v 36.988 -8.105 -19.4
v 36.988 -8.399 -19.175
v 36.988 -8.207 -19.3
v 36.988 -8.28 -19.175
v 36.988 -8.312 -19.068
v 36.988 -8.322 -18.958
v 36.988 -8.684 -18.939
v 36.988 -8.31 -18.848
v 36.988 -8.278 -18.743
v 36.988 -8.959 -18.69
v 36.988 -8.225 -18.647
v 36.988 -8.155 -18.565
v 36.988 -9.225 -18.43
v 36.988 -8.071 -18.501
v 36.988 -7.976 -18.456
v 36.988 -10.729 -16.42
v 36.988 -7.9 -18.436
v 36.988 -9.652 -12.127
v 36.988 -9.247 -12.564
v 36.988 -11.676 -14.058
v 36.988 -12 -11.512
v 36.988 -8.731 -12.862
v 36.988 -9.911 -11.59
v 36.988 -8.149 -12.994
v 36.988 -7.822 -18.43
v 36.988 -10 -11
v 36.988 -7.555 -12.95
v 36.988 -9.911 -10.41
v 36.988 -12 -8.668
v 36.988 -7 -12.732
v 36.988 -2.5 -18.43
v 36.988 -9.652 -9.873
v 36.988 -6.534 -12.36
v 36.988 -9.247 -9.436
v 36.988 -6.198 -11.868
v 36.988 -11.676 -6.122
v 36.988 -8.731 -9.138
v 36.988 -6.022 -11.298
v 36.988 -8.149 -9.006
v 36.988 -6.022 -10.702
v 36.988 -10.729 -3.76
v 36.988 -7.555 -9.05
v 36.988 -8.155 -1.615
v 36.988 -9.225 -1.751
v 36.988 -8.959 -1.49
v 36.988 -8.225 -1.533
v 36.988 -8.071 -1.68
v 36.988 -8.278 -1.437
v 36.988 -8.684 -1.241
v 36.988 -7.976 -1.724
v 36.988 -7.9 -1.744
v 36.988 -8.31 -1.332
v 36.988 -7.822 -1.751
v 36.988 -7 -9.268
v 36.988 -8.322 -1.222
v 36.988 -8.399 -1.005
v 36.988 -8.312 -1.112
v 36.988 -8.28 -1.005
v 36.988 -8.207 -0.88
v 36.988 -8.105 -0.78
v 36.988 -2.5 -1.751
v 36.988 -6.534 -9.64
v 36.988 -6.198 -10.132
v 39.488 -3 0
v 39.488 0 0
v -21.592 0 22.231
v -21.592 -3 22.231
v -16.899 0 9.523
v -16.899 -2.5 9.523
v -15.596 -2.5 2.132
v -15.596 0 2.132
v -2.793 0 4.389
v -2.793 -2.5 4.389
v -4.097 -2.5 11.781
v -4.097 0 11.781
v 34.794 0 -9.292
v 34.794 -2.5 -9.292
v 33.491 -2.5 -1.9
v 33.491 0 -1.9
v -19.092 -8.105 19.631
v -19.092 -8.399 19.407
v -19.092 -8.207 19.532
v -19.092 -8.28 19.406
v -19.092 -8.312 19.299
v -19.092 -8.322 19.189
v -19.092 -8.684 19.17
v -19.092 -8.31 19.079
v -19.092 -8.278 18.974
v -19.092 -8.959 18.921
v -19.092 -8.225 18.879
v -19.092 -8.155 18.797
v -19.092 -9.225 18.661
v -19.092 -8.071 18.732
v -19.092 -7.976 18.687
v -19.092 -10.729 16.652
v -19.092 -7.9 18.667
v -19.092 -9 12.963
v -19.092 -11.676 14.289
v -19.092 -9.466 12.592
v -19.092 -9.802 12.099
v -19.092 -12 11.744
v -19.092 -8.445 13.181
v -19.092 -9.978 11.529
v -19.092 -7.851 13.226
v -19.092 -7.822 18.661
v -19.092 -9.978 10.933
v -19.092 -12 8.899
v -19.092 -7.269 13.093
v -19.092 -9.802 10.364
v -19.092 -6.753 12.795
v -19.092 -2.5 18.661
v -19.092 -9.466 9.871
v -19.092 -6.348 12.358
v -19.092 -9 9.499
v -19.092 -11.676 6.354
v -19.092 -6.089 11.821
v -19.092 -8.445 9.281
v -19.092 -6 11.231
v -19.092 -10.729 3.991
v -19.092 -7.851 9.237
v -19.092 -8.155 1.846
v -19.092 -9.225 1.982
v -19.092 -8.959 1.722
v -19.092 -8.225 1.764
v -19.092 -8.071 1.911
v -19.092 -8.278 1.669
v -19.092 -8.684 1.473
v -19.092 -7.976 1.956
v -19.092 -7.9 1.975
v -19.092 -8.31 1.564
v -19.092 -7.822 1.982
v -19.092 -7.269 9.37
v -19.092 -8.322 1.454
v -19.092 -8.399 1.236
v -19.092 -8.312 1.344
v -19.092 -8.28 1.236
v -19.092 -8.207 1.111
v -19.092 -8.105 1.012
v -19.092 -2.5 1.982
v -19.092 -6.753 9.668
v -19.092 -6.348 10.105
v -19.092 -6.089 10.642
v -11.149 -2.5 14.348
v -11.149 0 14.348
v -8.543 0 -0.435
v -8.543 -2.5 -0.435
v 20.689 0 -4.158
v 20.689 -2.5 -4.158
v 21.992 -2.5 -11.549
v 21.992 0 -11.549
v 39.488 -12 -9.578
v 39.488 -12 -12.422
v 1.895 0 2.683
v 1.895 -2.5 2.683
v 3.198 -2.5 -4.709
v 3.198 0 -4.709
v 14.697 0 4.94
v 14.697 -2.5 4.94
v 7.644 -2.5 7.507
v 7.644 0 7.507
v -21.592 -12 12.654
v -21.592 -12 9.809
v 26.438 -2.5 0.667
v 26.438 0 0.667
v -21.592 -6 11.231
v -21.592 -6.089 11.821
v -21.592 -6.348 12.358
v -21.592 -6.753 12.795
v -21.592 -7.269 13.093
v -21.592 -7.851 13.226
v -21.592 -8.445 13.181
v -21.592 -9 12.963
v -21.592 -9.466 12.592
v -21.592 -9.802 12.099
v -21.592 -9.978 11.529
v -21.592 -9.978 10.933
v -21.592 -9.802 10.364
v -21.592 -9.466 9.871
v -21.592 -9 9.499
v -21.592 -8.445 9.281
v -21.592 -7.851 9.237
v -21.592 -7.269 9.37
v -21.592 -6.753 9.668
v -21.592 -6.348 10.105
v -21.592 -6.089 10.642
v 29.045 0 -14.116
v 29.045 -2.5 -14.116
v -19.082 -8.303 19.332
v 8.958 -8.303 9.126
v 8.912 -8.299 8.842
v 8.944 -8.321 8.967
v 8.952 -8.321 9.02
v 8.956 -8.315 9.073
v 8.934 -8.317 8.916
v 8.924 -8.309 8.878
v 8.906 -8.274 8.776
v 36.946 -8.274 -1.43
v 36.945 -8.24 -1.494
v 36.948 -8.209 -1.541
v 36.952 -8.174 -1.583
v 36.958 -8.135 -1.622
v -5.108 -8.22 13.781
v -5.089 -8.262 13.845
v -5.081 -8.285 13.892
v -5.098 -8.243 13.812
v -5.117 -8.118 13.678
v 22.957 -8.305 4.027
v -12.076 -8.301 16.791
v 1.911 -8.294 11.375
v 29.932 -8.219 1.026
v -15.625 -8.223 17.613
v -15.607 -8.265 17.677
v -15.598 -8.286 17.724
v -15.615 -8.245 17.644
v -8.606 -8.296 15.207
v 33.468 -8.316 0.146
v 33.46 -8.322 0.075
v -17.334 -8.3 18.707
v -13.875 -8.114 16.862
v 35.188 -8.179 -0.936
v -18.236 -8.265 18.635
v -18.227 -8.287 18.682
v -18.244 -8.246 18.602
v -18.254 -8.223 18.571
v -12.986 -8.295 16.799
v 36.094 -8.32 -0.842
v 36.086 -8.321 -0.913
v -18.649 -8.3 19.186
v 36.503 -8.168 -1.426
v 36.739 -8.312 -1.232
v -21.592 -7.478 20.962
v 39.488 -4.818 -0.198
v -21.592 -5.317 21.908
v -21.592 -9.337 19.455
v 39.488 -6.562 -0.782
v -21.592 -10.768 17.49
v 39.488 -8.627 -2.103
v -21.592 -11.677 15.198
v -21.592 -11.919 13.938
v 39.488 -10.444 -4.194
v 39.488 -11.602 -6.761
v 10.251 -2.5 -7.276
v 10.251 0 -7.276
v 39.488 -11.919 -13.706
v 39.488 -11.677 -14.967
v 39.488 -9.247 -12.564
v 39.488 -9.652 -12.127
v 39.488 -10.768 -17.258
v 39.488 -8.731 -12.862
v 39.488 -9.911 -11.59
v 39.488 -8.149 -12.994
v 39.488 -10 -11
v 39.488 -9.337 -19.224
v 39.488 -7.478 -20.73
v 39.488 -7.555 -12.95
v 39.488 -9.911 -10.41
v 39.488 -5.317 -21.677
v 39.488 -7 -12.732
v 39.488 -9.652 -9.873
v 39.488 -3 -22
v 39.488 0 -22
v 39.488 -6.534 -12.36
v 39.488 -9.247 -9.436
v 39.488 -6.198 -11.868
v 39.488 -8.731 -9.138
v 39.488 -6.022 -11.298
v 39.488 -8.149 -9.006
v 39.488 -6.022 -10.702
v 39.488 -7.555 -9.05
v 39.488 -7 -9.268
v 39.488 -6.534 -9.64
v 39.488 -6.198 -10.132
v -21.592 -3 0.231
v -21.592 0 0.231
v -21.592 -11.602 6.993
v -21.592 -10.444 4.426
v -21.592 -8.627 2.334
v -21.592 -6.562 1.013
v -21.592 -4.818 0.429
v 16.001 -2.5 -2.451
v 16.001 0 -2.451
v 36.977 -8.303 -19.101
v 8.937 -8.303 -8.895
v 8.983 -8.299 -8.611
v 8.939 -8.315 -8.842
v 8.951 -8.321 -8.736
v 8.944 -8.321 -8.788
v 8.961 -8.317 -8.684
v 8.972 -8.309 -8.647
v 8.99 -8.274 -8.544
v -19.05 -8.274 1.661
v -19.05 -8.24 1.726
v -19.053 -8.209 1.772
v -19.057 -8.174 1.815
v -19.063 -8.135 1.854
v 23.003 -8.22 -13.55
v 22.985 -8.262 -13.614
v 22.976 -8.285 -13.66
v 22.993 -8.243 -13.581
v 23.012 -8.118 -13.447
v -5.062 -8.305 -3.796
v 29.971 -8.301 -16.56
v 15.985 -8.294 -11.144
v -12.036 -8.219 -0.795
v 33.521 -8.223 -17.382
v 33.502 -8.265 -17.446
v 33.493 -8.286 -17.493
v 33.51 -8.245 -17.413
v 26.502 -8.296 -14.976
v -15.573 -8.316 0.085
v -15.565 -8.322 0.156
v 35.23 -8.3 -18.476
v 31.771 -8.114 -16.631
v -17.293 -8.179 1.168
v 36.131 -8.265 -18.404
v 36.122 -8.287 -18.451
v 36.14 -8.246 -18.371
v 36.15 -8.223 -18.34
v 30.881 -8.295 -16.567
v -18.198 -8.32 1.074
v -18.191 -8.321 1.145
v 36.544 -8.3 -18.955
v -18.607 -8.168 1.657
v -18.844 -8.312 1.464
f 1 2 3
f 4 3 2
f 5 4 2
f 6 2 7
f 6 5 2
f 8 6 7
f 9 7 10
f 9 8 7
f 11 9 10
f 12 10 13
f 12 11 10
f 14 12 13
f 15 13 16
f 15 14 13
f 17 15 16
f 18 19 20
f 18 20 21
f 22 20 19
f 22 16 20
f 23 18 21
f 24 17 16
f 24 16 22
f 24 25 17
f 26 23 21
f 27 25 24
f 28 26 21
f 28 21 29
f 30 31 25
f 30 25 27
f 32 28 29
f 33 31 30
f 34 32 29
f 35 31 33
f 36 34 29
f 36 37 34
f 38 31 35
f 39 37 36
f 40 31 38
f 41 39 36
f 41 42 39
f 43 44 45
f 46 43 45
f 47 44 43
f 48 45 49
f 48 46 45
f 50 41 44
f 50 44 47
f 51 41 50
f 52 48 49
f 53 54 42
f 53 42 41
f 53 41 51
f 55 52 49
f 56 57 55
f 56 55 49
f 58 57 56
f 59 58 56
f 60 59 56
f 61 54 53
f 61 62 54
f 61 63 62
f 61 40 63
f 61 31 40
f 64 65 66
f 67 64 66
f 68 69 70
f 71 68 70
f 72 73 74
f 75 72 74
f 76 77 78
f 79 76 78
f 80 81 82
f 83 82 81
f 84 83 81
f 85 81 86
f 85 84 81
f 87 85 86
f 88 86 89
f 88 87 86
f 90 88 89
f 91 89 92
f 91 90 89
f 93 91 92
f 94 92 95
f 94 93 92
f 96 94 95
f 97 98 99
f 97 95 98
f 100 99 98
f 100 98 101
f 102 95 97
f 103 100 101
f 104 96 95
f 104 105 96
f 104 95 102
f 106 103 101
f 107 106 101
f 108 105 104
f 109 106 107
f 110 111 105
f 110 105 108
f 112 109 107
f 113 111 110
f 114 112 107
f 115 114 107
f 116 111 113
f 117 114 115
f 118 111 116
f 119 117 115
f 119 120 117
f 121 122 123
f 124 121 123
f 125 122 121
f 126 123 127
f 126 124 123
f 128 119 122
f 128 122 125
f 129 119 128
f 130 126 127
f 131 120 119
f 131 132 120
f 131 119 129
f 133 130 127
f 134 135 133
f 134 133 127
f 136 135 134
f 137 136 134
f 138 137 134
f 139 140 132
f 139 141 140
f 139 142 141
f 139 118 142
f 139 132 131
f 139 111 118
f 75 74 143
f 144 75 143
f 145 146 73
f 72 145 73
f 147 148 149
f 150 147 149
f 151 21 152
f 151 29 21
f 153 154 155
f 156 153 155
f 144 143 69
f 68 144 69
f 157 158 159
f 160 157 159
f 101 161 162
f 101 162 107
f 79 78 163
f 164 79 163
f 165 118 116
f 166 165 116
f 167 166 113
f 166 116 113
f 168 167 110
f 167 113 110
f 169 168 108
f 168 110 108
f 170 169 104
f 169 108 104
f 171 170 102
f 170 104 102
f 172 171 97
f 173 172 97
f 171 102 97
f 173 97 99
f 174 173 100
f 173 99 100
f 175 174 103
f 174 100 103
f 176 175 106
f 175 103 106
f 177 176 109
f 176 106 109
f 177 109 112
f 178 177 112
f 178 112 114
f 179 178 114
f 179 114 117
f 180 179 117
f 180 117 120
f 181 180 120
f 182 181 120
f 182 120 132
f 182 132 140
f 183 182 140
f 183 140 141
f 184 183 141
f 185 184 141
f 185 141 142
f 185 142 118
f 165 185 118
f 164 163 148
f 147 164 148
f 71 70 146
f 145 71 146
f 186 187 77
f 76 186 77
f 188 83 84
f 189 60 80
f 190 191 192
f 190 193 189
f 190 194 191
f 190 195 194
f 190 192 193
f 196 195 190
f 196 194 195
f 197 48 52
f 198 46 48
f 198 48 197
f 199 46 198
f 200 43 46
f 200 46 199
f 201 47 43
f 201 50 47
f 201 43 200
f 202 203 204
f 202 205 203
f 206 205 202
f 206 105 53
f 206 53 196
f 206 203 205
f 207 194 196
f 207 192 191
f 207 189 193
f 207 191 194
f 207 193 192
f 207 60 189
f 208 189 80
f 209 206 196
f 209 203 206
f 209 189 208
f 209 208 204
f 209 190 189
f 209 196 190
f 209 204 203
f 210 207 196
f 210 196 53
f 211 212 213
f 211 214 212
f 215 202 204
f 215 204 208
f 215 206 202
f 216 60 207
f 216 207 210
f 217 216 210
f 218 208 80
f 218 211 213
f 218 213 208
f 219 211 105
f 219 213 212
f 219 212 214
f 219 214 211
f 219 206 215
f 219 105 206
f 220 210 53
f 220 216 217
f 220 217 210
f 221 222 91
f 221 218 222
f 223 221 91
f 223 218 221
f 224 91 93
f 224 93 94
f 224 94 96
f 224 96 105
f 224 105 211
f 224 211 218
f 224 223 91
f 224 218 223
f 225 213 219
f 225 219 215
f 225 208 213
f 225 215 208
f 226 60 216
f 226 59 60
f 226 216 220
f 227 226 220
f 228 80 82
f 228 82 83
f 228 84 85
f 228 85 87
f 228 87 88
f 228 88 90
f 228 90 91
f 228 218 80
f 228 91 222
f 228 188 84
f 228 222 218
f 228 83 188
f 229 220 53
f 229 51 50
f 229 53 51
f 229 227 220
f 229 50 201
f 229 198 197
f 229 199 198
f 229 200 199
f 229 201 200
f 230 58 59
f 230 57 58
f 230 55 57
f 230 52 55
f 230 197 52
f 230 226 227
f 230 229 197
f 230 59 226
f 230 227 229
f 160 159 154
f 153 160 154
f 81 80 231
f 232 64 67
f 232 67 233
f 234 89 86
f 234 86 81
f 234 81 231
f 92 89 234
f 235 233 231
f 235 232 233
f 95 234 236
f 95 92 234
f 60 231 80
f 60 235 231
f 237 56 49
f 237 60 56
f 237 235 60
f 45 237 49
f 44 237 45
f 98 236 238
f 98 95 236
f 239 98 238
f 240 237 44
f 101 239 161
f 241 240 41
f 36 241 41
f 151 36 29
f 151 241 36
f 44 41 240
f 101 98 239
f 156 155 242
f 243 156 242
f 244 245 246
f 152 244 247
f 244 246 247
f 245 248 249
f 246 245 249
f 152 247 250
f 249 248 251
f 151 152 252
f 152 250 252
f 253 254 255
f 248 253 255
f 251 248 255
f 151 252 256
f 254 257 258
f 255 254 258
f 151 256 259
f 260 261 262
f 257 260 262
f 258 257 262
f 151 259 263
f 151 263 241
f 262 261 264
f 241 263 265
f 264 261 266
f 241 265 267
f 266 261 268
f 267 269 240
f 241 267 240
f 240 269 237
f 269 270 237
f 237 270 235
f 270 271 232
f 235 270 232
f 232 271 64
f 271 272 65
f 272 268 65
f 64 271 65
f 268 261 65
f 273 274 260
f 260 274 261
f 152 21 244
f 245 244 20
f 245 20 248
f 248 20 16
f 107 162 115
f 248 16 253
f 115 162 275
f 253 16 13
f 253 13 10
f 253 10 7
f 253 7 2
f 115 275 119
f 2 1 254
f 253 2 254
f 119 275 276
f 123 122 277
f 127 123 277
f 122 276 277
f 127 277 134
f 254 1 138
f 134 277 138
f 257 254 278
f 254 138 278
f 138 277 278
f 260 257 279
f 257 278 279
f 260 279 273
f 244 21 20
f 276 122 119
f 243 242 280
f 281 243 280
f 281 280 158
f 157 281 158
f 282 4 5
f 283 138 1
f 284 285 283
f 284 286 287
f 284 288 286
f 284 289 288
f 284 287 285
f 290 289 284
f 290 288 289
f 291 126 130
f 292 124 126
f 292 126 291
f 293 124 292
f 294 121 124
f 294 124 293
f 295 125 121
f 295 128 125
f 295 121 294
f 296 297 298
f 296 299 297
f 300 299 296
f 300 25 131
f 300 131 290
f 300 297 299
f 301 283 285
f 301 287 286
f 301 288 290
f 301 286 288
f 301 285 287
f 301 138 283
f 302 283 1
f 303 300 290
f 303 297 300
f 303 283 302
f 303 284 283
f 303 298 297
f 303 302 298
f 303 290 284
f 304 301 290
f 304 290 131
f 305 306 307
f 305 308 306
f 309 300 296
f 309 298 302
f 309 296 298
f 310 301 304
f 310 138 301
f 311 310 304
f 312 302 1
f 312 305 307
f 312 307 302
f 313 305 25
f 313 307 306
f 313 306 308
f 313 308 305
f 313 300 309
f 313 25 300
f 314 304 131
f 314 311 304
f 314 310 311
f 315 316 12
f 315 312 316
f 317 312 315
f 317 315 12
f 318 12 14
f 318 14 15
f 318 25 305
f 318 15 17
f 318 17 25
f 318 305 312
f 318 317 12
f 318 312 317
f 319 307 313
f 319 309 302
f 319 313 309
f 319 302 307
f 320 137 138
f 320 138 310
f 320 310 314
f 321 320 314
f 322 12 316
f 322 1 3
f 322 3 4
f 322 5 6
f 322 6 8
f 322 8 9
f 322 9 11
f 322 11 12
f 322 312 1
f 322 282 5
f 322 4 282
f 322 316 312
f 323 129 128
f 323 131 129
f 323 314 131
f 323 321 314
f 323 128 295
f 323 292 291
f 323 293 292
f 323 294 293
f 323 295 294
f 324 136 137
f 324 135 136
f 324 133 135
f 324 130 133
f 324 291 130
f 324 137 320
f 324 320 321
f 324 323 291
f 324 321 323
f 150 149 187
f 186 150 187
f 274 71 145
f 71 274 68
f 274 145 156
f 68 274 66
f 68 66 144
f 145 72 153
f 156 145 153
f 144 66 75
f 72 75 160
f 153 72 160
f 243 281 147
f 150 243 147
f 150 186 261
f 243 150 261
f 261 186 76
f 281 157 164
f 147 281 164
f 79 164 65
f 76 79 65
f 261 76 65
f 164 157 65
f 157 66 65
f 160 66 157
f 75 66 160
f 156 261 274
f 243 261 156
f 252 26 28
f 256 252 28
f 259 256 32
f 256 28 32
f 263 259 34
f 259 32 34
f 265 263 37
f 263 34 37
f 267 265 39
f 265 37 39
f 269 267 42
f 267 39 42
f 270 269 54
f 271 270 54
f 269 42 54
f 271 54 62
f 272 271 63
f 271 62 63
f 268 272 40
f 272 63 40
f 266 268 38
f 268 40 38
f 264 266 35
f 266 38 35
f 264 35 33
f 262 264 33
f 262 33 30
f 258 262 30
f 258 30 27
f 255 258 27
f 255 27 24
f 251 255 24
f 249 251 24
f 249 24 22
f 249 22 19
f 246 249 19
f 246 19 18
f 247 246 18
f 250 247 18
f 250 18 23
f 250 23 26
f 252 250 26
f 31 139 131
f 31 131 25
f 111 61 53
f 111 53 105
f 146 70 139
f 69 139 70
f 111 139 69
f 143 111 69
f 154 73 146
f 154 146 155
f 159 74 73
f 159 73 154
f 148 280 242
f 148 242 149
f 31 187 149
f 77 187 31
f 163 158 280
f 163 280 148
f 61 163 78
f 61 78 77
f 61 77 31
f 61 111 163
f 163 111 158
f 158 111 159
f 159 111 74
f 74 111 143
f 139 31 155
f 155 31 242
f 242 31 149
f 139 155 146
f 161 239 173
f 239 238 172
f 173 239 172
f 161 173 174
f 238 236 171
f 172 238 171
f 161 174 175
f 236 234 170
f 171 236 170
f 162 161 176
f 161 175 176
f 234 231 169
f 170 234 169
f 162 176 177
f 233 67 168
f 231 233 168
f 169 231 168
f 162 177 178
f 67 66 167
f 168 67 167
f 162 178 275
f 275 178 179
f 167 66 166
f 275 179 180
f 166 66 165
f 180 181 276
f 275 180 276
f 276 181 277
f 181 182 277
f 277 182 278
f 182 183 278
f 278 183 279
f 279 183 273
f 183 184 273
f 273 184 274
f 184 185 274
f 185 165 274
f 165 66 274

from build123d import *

# Parameters (mm, degrees)
F1_DEPTH    = 12
F2_T        = -2.5
F4_D        = 4
F4_DEPTH    = 6
F4_TIP      = 1.2017212381
F6_D        = 4
F6_DEPTH    = 6
F6_TIP      = 1.2017212381
F7_T1_DEPTH = 110
F7_T3_DEPTH = 110
F9_DEPTH    = 25
F10_R       = 0.5


# Not quite as in the source:
# - a fillet or chamfer that OpenCascade refuses, or shapes differently, is made with other operations: its cross-section is extruded or revolved along the edge and cut away or added


with BuildPart() as f1:
    # F0 (on Front) → F1 (new body)
    with BuildSketch(Plane.XZ):
        Polygon((39.4877206884, 0), (-21.5922996627, 22.2313093162), (-21.5922996627, 0.2313093162), (39.4877206884, -22), align=None)
    extrude(amount=F1_DEPTH)

    # F2
    f2_openings = [f1.faces().sort_by_distance(p)[0] for p in [
        (8.947711, -12, 0.115655),
    ]]
    offset(amount=F2_T, openings=f2_openings)

    # F4
    with Locations(Plane(origin=(-21.5922996627, 0, 0), x_dir=(0, -1, 0), z_dir=(-1, 0, 0))):
        with Locations((8, 11.2313093162)):
            Hole(F4_D / 2, depth=F4_DEPTH)
            with Locations((0, 0, -(F4_DEPTH + F4_TIP / 2))):  # 118° drill point
                Cone(0, F4_D / 2, F4_TIP, mode=Mode.SUBTRACT)

    # F6
    with Locations(Plane.YZ.offset(39.4877206884)):
        with Locations((-8, -11)):
            Hole(F6_D / 2, depth=F6_DEPTH)
            with Locations((0, 0, -(F6_DEPTH + F6_TIP / 2))):  # 118° drill point
                Cone(0, F6_D / 2, F6_TIP, mode=Mode.SUBTRACT)

    # F7: fillet of radius 9 on 2 edges, made by hand

    # F7_s2 → F7_t1 (cut)
    with BuildSketch(Plane(origin=(56.0116188142, 0, -20.3865620214), x_dir=(0, 1, 0), z_dir=(-0.9396926208, 0, 0.3420201433))):
        with BuildLine():
            ThreePointArc((-3, -13.5055958894), (-9.3639610307, -10.8695569201), (-12, -4.5055958894))
            Line((-12, -4.5055958894), (-12, -13.5055958894))
            Line((-12, -13.5055958894), (-3, -13.5055958894))
        make_face()
    extrude(amount=F7_T1_DEPTH, mode=Mode.SUBTRACT)

    # F7_s4 → F7_t3 (cut)
    with BuildSketch(Plane(origin=(-40.2839057657, 0, 14.6621426187), x_dir=(0, 1, 0), z_dir=(0.9396926208, 0, -0.3420201433))):
        with BuildLine():
            ThreePointArc((-12, 1.8323582321), (-9.3639610307, -4.5316027985), (-3, -7.1676417679))
            Line((-3, -7.1676417679), (-12, -7.1676417679))
            Line((-12, -7.1676417679), (-12, 1.8323582321))
        make_face()
    extrude(amount=F7_T3_DEPTH, mode=Mode.SUBTRACT)

    # F8 (on face) → F9 (cut)
    with BuildSketch(Plane.XZ.offset(2.5)):
        Polygon((-8.5428162153, -0.4354697523), (-2.7932286645, 4.389007041), (-4.0965543521, 11.7805343179), (-11.1494675905, 14.3475848015), (-16.8990551413, 9.5231080082), (-15.5957294537, 2.1315807313), align=None)
        Polygon((10.2510362004, -7.2758726188), (16.0006237512, -2.4513958255), (14.6972980636, 4.9401314514), (7.6443848253, 7.507181935), (1.8947972745, 2.6827051417), (3.198122962, -4.7088221352), align=None)
        Polygon((29.0448886161, -14.1162754854), (34.7944761669, -9.2917986921), (33.4911504793, -1.9002714151), (26.438237241, 0.6667790685), (20.6886496902, -4.1576977248), (21.9919753777, -11.5492250017), align=None)
    extrude(amount=-F9_DEPTH, mode=Mode.SUBTRACT)

    # F10
    f10_edges = [f1.edges().sort_by_distance(p)[0] for p in [
        (8.947711, -9.22495, -8.223901),
        (8.947711, -9.22495, 8.45521),
    ]]
    fillet(f10_edges, radius=F10_R)


solid = f1.part
